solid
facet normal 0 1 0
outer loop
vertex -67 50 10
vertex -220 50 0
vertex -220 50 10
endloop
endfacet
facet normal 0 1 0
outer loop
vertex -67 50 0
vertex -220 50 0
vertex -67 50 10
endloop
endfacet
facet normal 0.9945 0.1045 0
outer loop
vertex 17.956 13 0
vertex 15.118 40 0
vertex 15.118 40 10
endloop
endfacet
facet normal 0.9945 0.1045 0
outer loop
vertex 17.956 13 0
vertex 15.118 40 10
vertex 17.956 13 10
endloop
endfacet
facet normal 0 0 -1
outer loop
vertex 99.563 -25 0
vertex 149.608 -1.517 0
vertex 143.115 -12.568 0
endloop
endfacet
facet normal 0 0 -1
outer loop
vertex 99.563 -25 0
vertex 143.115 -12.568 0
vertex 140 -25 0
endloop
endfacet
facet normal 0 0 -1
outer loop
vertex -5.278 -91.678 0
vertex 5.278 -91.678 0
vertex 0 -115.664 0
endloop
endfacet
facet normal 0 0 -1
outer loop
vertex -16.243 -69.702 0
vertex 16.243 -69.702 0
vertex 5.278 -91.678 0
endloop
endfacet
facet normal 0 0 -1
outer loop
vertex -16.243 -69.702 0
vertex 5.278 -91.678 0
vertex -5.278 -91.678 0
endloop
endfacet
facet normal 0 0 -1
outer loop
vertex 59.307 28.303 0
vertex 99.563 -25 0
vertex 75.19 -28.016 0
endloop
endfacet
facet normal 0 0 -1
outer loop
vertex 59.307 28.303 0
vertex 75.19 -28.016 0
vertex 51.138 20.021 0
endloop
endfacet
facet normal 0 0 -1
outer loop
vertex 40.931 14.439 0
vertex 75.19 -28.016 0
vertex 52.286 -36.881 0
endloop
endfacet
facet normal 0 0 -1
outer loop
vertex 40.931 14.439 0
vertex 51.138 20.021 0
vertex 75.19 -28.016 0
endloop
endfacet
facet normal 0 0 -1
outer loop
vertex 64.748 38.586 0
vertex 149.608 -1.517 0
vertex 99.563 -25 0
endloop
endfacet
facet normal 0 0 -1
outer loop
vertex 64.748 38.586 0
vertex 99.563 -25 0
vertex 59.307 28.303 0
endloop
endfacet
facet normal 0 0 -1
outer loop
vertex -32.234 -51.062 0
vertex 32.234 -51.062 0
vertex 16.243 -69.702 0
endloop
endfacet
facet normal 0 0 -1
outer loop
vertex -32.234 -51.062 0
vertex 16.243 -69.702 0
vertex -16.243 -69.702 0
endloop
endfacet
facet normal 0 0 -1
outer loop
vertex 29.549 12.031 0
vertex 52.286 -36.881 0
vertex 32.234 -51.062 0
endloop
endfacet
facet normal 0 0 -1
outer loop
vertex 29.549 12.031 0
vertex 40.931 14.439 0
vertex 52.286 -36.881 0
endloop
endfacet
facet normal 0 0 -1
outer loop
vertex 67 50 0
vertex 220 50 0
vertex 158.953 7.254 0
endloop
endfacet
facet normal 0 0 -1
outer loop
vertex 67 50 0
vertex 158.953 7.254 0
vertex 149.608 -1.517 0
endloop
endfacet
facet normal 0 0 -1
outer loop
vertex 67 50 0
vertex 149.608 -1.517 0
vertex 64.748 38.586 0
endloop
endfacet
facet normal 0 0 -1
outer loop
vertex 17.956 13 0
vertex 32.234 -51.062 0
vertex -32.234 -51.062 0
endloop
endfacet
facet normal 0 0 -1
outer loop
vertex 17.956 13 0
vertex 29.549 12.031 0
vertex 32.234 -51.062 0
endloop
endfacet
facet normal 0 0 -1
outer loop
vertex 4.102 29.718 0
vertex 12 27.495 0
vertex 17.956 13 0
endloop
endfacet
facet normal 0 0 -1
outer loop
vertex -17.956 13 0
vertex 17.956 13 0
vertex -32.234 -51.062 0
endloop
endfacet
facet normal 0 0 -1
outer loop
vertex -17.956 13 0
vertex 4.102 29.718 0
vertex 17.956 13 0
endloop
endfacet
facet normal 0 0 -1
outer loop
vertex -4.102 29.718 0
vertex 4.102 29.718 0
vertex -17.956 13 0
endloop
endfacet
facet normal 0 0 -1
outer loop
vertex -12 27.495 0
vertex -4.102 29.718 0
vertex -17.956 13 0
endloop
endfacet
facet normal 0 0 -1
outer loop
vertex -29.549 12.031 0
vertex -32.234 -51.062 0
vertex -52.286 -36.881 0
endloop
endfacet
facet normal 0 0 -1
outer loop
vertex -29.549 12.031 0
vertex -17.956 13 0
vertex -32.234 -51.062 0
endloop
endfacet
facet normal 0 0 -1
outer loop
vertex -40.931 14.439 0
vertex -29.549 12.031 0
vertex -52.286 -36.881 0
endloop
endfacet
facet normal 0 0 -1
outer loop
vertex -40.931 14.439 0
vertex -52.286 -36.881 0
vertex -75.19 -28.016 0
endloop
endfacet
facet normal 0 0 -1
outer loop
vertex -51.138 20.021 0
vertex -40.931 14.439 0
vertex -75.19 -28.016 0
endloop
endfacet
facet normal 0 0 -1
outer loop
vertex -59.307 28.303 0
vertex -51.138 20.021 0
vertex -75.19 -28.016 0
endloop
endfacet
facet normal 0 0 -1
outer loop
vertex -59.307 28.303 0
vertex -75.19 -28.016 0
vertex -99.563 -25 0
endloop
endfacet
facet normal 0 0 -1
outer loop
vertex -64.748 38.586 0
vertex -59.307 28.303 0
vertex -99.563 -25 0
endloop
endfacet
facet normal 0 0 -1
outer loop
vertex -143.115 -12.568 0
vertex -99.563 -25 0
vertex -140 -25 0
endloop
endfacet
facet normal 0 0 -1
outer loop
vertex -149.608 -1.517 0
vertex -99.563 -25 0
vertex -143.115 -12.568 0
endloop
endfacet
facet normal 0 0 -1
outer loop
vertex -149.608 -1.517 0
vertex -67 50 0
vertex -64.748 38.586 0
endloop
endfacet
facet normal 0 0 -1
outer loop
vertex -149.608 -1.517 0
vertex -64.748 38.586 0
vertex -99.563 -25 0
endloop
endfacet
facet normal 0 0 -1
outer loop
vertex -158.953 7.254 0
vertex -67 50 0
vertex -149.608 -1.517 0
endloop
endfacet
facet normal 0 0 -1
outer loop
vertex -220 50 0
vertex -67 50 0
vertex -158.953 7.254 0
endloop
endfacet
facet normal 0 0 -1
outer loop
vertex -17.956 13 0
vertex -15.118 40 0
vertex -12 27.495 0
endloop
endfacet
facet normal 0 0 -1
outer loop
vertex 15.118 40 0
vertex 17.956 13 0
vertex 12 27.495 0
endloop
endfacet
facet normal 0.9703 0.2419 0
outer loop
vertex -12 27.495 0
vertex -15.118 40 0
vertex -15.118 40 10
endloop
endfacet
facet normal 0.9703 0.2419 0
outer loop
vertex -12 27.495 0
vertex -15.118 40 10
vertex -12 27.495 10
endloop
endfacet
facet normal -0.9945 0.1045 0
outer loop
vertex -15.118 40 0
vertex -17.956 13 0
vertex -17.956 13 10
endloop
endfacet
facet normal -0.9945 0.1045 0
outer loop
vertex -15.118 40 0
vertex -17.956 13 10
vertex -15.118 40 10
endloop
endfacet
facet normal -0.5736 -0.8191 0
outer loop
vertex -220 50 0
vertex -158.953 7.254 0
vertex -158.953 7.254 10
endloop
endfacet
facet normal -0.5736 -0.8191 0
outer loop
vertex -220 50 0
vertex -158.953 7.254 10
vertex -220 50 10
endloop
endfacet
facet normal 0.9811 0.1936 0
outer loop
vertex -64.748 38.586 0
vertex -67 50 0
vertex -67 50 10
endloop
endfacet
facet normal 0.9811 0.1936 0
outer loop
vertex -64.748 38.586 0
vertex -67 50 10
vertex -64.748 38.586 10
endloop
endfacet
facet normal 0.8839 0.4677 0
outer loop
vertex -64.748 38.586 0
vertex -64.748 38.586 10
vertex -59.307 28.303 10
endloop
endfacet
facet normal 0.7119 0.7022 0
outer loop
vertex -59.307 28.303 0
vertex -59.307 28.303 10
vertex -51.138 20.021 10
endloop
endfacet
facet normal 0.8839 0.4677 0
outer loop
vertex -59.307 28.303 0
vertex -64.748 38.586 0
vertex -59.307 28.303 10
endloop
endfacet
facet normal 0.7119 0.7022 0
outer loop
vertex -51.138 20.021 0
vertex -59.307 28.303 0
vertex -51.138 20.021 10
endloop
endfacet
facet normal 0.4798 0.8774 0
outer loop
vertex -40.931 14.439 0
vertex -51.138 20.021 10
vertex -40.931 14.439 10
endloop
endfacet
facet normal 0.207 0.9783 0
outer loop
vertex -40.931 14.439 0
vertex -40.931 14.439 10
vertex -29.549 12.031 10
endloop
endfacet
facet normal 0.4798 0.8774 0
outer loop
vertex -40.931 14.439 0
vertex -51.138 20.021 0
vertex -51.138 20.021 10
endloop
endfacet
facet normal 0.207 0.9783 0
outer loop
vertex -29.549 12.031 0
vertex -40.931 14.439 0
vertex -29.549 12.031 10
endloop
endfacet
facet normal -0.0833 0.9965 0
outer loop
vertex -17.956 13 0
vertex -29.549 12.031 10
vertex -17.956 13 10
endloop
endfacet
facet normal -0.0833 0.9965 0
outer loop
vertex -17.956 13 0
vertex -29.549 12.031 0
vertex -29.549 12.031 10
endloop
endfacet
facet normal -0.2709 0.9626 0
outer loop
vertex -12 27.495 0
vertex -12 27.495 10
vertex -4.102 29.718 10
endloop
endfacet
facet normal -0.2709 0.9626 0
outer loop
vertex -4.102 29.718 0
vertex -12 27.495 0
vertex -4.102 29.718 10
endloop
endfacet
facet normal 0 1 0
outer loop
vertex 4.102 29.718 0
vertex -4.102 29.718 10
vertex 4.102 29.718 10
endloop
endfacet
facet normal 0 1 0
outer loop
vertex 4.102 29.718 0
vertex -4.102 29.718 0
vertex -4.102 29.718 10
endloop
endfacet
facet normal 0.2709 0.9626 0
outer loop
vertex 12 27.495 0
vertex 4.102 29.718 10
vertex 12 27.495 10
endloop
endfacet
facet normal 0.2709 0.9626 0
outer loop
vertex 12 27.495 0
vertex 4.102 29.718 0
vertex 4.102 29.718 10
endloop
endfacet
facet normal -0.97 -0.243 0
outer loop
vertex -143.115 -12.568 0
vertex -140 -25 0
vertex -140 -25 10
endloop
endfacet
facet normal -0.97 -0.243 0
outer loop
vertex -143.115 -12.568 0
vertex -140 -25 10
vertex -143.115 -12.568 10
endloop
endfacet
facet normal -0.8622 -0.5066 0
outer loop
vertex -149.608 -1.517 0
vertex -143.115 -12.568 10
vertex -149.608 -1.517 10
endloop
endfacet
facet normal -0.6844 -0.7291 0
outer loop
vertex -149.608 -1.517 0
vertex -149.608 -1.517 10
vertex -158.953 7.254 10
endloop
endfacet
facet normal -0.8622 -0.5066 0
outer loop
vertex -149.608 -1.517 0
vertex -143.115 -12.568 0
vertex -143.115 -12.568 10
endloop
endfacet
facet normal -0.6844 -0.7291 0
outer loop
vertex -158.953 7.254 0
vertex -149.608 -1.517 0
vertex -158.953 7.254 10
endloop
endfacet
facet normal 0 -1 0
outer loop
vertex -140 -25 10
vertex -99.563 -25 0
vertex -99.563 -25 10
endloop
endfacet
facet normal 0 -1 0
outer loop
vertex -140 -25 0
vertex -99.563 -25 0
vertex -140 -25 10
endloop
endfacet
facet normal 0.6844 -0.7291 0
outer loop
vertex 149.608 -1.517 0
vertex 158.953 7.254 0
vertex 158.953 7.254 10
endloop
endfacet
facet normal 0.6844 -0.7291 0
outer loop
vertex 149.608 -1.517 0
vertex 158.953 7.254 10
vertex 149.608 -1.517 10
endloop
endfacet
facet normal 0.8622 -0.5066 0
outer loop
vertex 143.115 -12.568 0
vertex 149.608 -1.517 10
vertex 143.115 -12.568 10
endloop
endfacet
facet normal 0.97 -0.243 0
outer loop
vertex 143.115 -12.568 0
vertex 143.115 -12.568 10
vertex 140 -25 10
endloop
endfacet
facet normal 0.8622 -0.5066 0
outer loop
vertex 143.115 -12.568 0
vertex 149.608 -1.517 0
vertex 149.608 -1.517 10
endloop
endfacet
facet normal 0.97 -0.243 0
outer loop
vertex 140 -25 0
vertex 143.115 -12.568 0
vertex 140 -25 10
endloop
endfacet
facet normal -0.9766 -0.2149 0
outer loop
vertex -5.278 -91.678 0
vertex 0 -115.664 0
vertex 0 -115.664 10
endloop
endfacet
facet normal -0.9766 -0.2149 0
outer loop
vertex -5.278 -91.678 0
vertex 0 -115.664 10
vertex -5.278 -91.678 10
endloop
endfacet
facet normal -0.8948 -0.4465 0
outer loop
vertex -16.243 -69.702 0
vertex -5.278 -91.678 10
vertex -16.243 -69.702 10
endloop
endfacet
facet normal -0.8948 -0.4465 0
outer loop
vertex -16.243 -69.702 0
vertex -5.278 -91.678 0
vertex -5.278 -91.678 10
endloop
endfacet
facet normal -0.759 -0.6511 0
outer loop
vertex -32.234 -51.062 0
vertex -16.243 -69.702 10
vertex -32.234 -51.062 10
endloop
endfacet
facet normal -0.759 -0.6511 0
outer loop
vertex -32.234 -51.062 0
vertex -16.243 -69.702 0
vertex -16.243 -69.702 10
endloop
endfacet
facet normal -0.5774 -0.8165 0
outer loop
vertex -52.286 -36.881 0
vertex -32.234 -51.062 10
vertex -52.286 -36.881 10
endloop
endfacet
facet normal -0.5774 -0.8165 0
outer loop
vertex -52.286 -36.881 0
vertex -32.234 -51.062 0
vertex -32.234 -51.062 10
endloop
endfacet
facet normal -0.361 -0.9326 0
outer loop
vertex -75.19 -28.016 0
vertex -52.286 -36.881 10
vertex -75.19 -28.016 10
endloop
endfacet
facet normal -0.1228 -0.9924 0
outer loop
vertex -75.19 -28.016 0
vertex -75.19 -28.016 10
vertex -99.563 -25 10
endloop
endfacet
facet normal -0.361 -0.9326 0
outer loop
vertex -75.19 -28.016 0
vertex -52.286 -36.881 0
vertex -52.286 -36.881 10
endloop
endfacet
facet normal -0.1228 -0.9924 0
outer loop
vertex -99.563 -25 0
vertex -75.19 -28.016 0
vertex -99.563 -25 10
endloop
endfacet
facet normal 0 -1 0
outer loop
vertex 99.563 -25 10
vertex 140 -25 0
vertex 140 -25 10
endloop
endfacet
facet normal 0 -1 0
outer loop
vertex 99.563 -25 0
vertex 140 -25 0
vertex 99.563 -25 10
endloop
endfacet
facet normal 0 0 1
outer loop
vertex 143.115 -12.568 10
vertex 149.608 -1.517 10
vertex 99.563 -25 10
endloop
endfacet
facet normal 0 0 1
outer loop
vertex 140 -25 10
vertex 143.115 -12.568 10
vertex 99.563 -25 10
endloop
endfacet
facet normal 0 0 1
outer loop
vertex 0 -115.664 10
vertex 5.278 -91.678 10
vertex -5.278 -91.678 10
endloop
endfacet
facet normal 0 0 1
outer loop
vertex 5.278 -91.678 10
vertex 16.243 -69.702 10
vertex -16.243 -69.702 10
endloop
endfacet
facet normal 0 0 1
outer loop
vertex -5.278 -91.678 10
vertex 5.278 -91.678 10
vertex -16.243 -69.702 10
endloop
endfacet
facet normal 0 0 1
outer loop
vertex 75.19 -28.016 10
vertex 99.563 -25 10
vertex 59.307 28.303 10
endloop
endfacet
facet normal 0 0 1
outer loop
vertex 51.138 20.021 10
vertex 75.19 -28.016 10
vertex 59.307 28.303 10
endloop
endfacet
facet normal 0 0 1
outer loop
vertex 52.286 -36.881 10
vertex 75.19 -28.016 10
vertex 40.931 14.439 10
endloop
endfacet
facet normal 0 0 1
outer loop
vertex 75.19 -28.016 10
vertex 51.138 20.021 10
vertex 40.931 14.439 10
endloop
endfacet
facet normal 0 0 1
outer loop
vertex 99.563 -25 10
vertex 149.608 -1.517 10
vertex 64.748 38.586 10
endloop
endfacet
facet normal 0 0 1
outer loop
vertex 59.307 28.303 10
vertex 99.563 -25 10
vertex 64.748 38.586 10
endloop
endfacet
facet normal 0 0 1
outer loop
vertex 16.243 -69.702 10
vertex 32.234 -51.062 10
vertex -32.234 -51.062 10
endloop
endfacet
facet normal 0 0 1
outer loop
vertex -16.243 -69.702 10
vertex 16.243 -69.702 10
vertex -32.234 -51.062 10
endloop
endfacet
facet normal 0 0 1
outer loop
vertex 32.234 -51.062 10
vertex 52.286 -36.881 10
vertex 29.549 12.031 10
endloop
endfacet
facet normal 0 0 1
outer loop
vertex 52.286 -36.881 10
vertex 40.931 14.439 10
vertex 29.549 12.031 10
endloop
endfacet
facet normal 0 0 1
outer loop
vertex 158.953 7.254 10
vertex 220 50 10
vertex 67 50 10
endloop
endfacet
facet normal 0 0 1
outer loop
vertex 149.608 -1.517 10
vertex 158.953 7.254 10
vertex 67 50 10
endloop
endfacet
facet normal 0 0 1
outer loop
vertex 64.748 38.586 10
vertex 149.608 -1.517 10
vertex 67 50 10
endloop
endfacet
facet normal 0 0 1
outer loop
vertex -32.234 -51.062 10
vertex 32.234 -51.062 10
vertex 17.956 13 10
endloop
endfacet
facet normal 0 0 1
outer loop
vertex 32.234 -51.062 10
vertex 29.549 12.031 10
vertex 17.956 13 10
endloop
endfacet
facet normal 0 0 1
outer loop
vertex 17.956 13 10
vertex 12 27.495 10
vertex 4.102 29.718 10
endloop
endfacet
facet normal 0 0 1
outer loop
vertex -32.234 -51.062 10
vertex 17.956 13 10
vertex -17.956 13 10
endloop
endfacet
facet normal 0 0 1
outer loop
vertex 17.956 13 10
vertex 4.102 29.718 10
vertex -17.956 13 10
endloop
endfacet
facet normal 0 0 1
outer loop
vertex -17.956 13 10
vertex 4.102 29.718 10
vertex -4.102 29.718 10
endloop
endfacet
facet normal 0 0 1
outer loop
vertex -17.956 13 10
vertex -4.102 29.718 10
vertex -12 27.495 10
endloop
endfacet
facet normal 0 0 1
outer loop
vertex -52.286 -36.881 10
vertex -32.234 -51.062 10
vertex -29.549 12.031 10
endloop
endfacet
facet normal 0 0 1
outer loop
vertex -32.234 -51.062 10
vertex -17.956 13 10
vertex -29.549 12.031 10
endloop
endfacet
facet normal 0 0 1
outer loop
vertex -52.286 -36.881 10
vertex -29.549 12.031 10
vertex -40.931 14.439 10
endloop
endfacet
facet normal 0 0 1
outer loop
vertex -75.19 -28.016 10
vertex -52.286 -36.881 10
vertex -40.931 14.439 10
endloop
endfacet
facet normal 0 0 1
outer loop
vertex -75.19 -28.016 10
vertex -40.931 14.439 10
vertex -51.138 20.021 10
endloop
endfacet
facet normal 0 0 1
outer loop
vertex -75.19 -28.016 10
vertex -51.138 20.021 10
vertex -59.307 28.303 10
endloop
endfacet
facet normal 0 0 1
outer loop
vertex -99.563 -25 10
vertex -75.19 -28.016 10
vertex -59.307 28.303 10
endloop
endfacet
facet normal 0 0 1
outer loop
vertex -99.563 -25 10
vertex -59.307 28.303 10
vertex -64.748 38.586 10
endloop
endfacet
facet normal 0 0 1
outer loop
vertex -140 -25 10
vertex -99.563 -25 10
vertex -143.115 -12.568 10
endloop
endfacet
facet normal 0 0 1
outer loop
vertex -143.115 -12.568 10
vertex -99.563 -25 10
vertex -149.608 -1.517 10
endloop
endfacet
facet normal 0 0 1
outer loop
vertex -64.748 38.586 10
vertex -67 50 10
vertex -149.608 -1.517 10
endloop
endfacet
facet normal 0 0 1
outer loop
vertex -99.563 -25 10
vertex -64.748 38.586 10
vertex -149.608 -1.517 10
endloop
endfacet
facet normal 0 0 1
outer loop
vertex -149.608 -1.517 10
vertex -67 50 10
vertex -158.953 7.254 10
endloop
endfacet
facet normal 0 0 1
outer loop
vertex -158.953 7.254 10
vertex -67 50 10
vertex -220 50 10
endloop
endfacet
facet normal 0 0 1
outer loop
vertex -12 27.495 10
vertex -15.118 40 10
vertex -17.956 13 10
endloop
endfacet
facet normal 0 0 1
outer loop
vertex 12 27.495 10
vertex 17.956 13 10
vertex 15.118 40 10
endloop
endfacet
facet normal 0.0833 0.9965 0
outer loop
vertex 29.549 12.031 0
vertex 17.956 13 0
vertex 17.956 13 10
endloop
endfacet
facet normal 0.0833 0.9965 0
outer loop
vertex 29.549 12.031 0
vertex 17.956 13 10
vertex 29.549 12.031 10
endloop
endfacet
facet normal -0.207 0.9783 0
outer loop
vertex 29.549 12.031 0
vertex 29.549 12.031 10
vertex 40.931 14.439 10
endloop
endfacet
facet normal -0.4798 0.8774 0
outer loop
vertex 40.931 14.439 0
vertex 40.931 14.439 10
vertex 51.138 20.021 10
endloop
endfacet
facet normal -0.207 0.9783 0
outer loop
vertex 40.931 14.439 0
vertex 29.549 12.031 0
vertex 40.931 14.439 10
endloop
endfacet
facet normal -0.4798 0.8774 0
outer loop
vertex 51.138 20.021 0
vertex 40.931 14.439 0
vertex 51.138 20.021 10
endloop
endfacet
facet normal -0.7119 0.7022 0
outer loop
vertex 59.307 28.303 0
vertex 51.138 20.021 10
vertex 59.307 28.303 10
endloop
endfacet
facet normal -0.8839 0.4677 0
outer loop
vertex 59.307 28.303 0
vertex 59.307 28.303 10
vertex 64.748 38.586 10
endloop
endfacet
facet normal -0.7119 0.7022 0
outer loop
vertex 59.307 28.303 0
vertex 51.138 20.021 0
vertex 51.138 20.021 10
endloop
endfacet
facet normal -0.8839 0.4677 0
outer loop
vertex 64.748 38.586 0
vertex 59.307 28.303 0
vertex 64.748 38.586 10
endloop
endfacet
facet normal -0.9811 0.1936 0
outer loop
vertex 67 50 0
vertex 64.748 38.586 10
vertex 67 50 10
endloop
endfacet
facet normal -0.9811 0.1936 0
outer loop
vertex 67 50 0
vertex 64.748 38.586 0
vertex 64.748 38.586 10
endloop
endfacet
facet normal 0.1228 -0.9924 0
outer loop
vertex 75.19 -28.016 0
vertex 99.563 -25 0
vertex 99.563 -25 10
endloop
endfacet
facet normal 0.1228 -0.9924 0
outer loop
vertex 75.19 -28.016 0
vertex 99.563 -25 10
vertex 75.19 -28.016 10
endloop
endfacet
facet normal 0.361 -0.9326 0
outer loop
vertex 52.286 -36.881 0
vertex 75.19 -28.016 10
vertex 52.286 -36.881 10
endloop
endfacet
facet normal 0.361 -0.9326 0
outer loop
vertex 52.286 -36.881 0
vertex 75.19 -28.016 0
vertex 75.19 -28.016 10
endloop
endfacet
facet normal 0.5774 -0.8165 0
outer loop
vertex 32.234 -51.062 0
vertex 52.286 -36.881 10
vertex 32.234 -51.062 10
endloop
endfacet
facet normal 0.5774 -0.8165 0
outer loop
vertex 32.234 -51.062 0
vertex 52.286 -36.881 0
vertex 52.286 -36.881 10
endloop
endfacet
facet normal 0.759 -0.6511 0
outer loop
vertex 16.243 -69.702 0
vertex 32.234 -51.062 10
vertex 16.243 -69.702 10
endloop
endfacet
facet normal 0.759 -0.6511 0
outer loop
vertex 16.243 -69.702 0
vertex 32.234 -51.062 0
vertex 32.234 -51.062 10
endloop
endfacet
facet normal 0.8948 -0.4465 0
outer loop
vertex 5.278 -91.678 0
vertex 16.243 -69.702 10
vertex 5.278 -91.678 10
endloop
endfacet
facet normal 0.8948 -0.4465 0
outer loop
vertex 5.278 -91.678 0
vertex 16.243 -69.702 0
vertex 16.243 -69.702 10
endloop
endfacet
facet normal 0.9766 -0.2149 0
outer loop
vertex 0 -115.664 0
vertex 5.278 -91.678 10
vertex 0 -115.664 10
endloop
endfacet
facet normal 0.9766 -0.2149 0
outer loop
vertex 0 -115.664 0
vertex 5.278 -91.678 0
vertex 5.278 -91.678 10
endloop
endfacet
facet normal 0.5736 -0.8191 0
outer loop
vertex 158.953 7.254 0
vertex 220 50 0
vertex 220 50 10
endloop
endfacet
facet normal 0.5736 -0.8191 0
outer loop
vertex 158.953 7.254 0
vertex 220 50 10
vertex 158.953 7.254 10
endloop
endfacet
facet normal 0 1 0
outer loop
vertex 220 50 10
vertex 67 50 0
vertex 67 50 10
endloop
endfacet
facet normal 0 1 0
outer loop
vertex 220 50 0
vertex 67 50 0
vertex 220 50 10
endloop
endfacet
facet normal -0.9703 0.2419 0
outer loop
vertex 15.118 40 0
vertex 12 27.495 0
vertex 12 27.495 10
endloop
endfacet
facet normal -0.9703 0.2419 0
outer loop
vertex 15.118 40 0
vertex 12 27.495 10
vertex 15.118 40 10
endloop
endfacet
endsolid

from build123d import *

# Parameters (mm, degrees)
BOSS_EXTRUDE1_DEPTH = 10


with BuildPart() as part:
    # Sketch1 → Boss-Extrude1 (new body)
    with BuildSketch(Plane.XY):
        with BuildLine():
            Line((67, 50), (220, 50))
            Line((220, 50), (158.952536164, 7.254105633))
            ThreePointArc((158.952536164, 7.254105633), (145.965681261, -6.810123789), (140, -25))
            Line((140, -25), (99.563224144, -25))
            ThreePointArc((99.563224144, -25), (32.234251016, -51.062124878), (0, -115.663812449))
            ThreePointArc((0, -115.663812449), (-32.234251016, -51.062124878), (-99.563224144, -25))
            Line((-99.563224144, -25), (-140, -25))
            ThreePointArc((-140, -25), (-145.965681261, -6.810123789), (-158.952536164, 7.254105633))
            Line((-158.952536164, 7.254105633), (-220, 50))
            Line((-220, 50), (-67, 50))
            ThreePointArc((-67, 50), (-51.137889855, 20.020793424), (-17.95554779, 13))
            Line((-17.95554779, 13), (-15.117733438, 40))
            Line((-15.117733438, 40), (-12, 27.49545417))
            ThreePointArc((-12, 27.49545417), (0, 30), (12, 27.49545417))
            Line((12, 27.49545417), (15.117733438, 40))
            Line((15.117733438, 40), (17.95554779, 13))
            ThreePointArc((17.95554779, 13), (51.137889855, 20.020793424), (67, 50))
        make_face()
    extrude(amount=BOSS_EXTRUDE1_DEPTH)


solid = part.part
